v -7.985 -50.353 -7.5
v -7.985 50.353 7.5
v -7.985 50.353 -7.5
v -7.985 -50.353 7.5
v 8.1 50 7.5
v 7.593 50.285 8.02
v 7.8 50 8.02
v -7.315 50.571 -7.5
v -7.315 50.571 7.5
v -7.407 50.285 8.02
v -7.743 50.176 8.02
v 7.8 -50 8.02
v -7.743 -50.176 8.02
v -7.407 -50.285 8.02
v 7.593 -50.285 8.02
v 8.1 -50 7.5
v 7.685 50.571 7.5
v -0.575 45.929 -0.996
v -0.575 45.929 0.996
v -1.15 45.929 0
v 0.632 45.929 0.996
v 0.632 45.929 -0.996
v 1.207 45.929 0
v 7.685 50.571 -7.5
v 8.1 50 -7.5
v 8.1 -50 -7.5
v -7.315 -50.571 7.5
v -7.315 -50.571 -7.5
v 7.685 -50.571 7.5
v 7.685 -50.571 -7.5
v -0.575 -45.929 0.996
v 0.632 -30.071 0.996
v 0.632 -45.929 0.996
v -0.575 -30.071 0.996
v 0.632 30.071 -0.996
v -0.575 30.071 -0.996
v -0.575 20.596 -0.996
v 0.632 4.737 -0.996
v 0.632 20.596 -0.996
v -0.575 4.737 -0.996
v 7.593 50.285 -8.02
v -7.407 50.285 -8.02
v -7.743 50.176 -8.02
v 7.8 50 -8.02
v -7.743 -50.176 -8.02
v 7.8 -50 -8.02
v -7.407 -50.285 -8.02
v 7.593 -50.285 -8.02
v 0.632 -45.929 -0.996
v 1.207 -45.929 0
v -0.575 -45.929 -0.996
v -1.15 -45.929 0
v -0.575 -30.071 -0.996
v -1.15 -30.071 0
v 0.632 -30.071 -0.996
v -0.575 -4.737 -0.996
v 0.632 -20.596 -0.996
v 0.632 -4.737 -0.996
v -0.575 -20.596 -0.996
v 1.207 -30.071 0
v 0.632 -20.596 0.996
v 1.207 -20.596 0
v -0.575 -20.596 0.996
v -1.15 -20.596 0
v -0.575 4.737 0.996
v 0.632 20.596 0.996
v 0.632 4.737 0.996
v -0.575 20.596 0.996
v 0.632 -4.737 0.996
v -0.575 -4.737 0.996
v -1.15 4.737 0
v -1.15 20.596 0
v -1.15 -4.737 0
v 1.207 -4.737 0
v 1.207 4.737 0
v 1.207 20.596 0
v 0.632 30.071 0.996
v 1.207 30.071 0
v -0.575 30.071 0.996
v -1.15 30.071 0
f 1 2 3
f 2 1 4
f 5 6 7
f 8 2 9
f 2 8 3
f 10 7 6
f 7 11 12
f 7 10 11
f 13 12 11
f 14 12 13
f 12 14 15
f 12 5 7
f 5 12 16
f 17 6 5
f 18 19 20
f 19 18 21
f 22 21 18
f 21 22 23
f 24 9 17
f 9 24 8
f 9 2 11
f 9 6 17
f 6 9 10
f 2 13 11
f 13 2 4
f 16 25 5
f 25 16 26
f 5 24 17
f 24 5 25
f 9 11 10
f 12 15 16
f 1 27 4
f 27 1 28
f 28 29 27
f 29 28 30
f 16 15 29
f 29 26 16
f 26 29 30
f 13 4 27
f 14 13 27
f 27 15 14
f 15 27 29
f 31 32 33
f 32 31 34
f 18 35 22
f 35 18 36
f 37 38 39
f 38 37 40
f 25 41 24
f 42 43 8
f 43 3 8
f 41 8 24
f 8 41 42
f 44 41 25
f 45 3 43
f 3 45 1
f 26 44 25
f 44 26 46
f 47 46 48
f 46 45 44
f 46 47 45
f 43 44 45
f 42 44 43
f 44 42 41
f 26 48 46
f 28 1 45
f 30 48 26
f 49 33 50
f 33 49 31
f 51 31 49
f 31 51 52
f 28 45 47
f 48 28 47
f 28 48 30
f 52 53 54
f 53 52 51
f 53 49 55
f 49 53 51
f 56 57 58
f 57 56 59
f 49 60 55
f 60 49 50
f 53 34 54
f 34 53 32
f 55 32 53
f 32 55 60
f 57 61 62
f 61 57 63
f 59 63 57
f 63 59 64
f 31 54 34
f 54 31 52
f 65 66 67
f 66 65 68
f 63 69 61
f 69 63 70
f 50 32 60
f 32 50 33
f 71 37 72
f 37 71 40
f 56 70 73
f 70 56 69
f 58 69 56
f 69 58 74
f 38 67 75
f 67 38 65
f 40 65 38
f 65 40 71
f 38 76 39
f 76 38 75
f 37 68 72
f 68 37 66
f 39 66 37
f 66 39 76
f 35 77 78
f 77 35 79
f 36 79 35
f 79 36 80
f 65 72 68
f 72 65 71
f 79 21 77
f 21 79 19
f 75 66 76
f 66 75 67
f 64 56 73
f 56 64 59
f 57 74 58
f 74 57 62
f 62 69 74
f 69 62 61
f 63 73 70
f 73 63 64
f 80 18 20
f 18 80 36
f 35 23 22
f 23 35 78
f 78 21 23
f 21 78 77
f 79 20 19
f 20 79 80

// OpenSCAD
// Parameters
rail_length = 100.0; //[50.0:200.0:1.0]
rail_width = 15.0; //[7.5:30.0:0.5]
rail_height = 15.0; //[7.5:30.0:0.5]
hole_diameter = 3.5; //[2.0:7.0:0.1]
hole_count = 4; //[2:8:1]
end_margin = 12.0; //[6.0:24.0:0.5]
chamfer_size = 1.0; //[0.5:3.0:0.1]
fillet_radius = 0.8; //[0.3:2.0:0.1]
minkowski_sphere_radius = 0.6; //[0.2:1.5:0.1]
connect_overlap = 1.0; //[0.5:2.0:0.1]
marking_depth = 0.3; //[0.1:1.0:0.1]

// Rail Body
module rail_body() {
  color("Silver")
  cube([rail_width, rail_length, rail_height], center=true);
}

// Mounting Holes
module mounting_hole(position) {
  translate(position)
  rotate([90, 0, 0])
  cylinder(h=rail_height + 2*connect_overlap, r=hole_diameter/2, center=true);
}

module mounting_holes() {
  union() {
    for (i = [0:hole_count-1]) {
      mounting_hole([0, -rail_length/2 + end_margin + i*(rail_length - 2*end_margin)/(hole_count - 1), 0]);
    }
  }
}

// End Chamfers
module end_chamfer_wedge_posY() {
  linear_extrude(height=rail_width + 2*connect_overlap, center=true)
  rotate([0, 0, 90])
  polygon(points=[
    [-rail_height/2 - connect_overlap, rail_length/2 - chamfer_size - connect_overlap],
    [rail_height/2 + connect_overlap, rail_length/2 - chamfer_size - connect_overlap],
    [rail_height/2 + connect_overlap, rail_length/2 + connect_overlap]
  ]);
}

module end_chamfer_wedge_negY() {
  linear_extrude(height=rail_width + 2*connect_overlap, center=true)
  rotate([0, 0, -90])
  polygon(points=[
    [-rail_height/2 - connect_overlap, -rail_length/2 + chamfer_size + connect_overlap],
    [rail_height/2 + connect_overlap, -rail_length/2 + chamfer_size + connect_overlap],
    [rail_height/2 + connect_overlap, -rail_length/2 - connect_overlap]
  ]);
}

module end_chamfers() {
  union() {
    end_chamfer_wedge_posY();
    end_chamfer_wedge_negY();
  }
}

// Fillet Sphere Tool
module fillet_sphere_tool() {
  sphere(r=minkowski_sphere_radius, center=true);
}

// Engraved Markings (ignored per no-text rule)
module engraved_markings() {
  translate([0, 0, rail_height/2 - marking_depth/2 + connect_overlap])
  cube([rail_width*0.6, rail_length*0.4, marking_depth], center=true);
}

// Complete Model
difference() {
  minkowski() {
    difference() {
      difference() {
        rail_body();
        mounting_holes();
      }
      end_chamfers();
    }
    fillet_sphere_tool();
  }
  engraved_markings();
}
